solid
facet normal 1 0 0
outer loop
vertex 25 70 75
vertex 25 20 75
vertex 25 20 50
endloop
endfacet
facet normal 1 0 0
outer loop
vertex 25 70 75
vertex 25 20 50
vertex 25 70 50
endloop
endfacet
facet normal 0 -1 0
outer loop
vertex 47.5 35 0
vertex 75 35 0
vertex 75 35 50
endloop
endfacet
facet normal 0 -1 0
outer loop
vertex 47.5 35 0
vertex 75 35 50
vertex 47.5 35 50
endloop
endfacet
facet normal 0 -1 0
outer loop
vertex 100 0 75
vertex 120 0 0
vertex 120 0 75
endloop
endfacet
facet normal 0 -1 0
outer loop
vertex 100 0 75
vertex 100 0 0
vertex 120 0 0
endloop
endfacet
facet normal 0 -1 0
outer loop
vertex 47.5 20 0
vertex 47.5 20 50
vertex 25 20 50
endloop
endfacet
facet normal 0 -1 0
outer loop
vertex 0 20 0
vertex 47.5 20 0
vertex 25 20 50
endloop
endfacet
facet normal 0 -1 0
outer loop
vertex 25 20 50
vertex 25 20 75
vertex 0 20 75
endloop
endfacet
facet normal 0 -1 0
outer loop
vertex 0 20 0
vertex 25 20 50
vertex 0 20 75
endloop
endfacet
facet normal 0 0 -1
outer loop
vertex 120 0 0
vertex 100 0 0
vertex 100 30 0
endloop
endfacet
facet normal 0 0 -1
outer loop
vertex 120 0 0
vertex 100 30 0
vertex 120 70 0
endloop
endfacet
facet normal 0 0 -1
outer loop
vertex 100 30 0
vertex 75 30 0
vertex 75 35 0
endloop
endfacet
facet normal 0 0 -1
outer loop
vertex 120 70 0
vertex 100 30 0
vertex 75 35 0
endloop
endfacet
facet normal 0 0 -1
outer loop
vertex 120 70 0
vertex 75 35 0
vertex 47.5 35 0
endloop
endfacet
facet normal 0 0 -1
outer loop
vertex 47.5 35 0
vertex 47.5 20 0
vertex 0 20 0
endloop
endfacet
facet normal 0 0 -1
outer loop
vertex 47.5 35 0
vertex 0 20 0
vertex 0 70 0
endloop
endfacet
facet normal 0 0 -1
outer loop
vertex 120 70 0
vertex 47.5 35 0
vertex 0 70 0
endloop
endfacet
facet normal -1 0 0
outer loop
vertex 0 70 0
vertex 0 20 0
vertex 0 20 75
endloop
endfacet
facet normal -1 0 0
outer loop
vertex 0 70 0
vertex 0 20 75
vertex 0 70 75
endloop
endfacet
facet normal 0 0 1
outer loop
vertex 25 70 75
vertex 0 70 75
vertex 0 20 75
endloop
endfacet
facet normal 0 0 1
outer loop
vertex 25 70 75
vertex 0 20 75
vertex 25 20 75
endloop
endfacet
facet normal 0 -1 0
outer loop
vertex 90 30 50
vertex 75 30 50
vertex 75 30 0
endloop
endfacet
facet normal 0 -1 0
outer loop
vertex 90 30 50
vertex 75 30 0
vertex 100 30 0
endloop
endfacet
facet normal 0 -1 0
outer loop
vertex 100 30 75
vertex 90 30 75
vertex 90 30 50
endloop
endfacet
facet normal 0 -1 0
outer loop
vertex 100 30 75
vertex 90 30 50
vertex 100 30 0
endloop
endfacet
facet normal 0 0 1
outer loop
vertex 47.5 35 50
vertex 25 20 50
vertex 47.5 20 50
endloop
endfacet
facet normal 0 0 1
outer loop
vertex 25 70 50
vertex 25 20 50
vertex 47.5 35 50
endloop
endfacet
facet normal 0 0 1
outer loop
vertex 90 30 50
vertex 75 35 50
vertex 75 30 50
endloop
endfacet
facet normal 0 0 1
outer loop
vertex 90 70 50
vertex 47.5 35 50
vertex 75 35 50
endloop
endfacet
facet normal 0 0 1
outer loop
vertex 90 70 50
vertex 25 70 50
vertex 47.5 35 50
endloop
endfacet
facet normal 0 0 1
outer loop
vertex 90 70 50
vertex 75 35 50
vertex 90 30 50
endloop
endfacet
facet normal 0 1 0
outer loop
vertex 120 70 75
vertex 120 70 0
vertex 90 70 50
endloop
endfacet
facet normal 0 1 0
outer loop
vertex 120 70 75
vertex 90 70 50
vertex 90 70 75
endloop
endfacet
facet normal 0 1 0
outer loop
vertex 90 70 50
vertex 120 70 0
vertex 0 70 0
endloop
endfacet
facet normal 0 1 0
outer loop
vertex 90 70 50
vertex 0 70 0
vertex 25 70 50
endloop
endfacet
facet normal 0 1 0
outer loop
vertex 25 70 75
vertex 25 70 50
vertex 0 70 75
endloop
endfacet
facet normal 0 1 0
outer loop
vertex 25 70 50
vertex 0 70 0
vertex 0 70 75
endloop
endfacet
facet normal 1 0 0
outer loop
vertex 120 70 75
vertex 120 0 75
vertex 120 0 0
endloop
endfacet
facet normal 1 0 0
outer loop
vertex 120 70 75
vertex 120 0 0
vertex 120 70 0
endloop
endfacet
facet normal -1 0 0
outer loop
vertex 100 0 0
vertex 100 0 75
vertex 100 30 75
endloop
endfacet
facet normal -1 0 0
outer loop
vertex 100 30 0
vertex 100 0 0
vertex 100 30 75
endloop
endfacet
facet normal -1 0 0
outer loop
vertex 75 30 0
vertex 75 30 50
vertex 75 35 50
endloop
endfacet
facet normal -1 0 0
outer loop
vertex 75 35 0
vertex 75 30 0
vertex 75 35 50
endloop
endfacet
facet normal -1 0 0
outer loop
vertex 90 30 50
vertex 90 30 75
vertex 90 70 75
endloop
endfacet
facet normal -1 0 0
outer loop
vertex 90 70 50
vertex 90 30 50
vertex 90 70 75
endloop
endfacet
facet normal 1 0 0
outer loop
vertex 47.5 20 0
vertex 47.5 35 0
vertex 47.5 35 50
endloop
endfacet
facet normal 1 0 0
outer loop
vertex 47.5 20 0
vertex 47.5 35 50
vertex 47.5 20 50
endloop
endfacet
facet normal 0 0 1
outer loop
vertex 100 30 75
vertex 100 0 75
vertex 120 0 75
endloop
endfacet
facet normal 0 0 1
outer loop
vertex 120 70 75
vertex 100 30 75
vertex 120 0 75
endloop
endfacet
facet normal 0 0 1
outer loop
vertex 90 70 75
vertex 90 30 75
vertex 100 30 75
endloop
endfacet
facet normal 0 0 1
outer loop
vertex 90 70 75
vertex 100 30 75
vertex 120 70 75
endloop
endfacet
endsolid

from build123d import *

# Parameters (mm, degrees)
F0_W     = 110
F0_H     = 70
F1_DEPTH = 75
F3_DEPTH = 75.001
F4_W     = 65
F4_H     = 50
F5_DEPTH = 25
F6_W     = 10
F6_H     = 30
F7_DEPTH = 75.001
F8_W     = 70
F8_H     = 75
F9_DEPTH = 10


with BuildPart() as f1:
    # F0 (on Top) → F1 (new body)
    with BuildSketch(Plane.XY):
        with Locations((55, 35)):
            Rectangle(F0_W, F0_H)
    extrude(amount=F1_DEPTH)

    # F2 (on face) → F3 (cut, through all)
    with BuildSketch(Plane.XY.offset(75)):
        Polygon((0, 0), (90, 0), (90, 30), (75, 30), (75, 35), (47.5, 35), (47.5, 20), (0, 20), align=None)
    extrude(amount=-F3_DEPTH, mode=Mode.SUBTRACT)

    # F4 (on face) → F5 (cut)
    with BuildSketch(Plane.XY.offset(75)):
        with Locations((57.5, 45)):
            Rectangle(F4_W, F4_H)
    extrude(amount=-F5_DEPTH, mode=Mode.SUBTRACT)

    # F6 (on face) → F7 (cut, through all)
    with BuildSketch(Plane.XY.offset(75)):
        with Locations((95, 15)):
            Rectangle(F6_W, F6_H)
    extrude(amount=-F7_DEPTH, mode=Mode.SUBTRACT)

    # F8 (on face) → F9 (join)
    with BuildSketch(Plane.YZ.offset(110)):
        with Locations((35, 37.5)):
            Rectangle(F8_W, F8_H)
    extrude(amount=F9_DEPTH)


solid = f1.part
